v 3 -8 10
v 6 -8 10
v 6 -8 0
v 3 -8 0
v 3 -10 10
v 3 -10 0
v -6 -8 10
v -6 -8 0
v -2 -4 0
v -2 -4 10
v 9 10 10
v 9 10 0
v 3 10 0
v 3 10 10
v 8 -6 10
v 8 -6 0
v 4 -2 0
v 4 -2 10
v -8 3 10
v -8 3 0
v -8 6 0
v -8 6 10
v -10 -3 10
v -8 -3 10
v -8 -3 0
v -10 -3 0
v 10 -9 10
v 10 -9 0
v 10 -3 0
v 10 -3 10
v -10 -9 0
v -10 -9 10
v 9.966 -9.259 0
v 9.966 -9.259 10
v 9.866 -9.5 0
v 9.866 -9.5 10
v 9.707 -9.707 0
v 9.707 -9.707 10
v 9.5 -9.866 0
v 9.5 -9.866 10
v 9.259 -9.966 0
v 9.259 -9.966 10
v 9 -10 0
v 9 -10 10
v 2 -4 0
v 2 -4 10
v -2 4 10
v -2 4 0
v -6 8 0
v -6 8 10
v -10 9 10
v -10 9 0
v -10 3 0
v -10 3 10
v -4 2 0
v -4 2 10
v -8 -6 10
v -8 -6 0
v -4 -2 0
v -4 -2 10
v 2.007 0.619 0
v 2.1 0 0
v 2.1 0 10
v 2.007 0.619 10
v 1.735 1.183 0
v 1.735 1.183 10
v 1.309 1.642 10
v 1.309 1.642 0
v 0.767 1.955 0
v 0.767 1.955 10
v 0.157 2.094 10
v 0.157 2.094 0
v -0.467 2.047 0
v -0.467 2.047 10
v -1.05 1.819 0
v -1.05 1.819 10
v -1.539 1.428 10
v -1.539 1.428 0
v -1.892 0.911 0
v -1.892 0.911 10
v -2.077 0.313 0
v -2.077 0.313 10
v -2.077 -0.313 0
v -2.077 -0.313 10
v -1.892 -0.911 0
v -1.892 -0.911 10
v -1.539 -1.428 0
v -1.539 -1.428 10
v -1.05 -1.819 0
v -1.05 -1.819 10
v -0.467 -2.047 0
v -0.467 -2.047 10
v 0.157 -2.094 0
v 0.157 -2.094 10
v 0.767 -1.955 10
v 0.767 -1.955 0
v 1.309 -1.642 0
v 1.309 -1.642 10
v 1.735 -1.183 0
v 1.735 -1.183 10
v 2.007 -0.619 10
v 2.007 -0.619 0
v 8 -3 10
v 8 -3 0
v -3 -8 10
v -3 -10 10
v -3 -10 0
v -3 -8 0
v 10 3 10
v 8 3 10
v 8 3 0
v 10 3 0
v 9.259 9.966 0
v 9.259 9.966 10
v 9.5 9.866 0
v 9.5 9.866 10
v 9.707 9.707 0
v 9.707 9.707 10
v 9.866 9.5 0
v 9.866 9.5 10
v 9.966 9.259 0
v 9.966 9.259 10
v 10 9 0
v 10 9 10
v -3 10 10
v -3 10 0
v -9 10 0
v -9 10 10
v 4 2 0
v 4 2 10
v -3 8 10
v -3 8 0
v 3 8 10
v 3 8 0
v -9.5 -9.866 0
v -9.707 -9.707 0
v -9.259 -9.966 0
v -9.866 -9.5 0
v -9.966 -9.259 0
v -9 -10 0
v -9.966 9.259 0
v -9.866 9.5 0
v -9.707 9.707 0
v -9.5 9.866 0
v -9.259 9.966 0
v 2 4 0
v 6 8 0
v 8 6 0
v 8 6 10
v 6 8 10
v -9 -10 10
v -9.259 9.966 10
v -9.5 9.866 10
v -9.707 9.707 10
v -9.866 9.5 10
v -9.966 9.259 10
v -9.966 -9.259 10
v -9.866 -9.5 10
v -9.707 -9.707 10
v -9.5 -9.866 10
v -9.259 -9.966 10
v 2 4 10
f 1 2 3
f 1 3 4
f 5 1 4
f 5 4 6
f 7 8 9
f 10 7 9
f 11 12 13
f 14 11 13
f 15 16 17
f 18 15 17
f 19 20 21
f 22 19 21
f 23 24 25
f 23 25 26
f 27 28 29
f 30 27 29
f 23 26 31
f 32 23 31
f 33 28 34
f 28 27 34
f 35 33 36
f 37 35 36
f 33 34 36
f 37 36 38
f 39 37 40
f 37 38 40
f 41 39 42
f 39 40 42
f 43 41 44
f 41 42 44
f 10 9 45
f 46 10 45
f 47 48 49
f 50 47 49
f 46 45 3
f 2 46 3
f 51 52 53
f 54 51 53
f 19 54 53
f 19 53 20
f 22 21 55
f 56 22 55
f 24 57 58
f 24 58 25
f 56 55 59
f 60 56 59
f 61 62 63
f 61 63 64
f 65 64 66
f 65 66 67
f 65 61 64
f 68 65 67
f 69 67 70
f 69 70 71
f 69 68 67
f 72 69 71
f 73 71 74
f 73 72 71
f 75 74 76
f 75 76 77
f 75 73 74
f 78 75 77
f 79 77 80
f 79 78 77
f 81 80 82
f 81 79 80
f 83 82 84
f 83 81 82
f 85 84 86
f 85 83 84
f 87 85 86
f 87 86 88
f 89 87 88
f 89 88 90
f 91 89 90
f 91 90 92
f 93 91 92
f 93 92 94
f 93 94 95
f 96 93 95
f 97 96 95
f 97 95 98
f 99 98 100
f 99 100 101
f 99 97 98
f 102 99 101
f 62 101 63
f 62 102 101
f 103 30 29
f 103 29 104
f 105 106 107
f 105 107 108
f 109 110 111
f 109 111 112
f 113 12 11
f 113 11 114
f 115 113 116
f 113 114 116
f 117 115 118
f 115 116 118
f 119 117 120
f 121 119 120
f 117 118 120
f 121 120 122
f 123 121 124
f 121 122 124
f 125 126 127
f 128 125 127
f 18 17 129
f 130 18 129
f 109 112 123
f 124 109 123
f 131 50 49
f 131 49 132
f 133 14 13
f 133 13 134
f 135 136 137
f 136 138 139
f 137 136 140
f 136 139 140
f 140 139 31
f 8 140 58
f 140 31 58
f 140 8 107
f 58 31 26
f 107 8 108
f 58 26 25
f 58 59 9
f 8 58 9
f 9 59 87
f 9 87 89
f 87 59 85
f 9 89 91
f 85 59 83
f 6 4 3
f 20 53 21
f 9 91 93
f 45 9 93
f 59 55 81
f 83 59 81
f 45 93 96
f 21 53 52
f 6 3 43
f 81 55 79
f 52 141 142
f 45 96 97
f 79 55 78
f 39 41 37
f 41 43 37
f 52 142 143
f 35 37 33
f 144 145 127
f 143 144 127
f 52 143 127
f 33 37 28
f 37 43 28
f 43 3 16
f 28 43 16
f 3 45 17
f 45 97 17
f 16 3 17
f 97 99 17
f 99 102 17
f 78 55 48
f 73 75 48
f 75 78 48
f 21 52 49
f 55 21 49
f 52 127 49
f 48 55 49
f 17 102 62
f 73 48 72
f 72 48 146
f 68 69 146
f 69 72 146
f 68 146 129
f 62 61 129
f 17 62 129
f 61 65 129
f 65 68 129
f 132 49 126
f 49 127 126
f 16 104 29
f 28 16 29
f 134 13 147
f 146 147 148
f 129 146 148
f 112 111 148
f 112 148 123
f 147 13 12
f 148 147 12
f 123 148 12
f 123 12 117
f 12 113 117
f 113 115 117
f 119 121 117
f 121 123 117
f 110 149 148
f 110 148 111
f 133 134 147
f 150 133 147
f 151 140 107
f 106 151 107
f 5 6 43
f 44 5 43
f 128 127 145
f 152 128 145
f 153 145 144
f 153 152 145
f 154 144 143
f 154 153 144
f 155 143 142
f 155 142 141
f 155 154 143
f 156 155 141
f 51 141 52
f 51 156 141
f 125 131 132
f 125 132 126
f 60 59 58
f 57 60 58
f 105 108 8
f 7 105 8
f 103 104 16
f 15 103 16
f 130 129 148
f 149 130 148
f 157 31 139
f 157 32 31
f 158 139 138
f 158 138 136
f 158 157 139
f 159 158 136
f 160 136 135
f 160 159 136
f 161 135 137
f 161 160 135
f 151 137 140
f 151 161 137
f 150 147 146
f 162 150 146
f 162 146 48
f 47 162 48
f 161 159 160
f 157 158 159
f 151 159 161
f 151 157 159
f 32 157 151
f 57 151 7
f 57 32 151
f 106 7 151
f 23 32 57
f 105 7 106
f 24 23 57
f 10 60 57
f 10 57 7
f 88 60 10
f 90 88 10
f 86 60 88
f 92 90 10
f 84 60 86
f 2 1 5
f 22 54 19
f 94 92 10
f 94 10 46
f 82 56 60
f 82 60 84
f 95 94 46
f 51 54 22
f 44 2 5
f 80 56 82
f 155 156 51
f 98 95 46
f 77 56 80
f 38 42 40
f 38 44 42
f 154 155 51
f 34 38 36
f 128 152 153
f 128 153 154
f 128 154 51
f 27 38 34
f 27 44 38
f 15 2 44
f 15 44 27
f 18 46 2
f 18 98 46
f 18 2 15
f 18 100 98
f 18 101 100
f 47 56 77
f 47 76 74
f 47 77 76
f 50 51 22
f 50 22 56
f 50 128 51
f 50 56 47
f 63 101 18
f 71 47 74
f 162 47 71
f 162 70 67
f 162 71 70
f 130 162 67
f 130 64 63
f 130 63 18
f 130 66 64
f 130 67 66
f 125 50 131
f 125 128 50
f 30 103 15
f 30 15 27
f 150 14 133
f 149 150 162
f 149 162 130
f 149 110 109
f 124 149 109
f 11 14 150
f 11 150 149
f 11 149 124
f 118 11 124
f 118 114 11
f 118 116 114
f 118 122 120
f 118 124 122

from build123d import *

# Parameters (mm, degrees)
SKETCH1_R           = 2.1
BOSS_EXTRUDE1_DEPTH = 10
FILLET1_R           = 1


with BuildPart() as part:
    # Sketch1 → Boss-Extrude1 (new body)
    with BuildSketch(Plane.XY):
        Polygon((3, 10), (3, 8), (6, 8), (2, 4), (-2, 4), (-6, 8), (-3, 8), (-3, 10), (-10, 10), (-10, 3), (-8, 3), (-8, 6), (-4, 2), (-4, -2), (-8, -6), (-8, -3), (-10, -3), (-10, -10), (-3, -10), (-3, -8), (-6, -8), (-2, -4), (2, -4), (6, -8), (3, -8), (3, -10), (10, -10), (10, -3), (8, -3), (8, -6), (4, -2), (4, 2), (8, 6), (8, 3), (10, 3), (10, 10), align=None)
        Circle(SKETCH1_R, mode=Mode.SUBTRACT)
    extrude(amount=BOSS_EXTRUDE1_DEPTH)

    # Fillet1
    fillet1_edges = [part.edges().sort_by_distance(p)[0] for p in [
        (-10, 10, 5),
        (10, 10, 5),
        (10, -10, 5),
        (-10, -10, 5),
    ]]
    fillet(fillet1_edges, radius=FILLET1_R)


solid = part.part
